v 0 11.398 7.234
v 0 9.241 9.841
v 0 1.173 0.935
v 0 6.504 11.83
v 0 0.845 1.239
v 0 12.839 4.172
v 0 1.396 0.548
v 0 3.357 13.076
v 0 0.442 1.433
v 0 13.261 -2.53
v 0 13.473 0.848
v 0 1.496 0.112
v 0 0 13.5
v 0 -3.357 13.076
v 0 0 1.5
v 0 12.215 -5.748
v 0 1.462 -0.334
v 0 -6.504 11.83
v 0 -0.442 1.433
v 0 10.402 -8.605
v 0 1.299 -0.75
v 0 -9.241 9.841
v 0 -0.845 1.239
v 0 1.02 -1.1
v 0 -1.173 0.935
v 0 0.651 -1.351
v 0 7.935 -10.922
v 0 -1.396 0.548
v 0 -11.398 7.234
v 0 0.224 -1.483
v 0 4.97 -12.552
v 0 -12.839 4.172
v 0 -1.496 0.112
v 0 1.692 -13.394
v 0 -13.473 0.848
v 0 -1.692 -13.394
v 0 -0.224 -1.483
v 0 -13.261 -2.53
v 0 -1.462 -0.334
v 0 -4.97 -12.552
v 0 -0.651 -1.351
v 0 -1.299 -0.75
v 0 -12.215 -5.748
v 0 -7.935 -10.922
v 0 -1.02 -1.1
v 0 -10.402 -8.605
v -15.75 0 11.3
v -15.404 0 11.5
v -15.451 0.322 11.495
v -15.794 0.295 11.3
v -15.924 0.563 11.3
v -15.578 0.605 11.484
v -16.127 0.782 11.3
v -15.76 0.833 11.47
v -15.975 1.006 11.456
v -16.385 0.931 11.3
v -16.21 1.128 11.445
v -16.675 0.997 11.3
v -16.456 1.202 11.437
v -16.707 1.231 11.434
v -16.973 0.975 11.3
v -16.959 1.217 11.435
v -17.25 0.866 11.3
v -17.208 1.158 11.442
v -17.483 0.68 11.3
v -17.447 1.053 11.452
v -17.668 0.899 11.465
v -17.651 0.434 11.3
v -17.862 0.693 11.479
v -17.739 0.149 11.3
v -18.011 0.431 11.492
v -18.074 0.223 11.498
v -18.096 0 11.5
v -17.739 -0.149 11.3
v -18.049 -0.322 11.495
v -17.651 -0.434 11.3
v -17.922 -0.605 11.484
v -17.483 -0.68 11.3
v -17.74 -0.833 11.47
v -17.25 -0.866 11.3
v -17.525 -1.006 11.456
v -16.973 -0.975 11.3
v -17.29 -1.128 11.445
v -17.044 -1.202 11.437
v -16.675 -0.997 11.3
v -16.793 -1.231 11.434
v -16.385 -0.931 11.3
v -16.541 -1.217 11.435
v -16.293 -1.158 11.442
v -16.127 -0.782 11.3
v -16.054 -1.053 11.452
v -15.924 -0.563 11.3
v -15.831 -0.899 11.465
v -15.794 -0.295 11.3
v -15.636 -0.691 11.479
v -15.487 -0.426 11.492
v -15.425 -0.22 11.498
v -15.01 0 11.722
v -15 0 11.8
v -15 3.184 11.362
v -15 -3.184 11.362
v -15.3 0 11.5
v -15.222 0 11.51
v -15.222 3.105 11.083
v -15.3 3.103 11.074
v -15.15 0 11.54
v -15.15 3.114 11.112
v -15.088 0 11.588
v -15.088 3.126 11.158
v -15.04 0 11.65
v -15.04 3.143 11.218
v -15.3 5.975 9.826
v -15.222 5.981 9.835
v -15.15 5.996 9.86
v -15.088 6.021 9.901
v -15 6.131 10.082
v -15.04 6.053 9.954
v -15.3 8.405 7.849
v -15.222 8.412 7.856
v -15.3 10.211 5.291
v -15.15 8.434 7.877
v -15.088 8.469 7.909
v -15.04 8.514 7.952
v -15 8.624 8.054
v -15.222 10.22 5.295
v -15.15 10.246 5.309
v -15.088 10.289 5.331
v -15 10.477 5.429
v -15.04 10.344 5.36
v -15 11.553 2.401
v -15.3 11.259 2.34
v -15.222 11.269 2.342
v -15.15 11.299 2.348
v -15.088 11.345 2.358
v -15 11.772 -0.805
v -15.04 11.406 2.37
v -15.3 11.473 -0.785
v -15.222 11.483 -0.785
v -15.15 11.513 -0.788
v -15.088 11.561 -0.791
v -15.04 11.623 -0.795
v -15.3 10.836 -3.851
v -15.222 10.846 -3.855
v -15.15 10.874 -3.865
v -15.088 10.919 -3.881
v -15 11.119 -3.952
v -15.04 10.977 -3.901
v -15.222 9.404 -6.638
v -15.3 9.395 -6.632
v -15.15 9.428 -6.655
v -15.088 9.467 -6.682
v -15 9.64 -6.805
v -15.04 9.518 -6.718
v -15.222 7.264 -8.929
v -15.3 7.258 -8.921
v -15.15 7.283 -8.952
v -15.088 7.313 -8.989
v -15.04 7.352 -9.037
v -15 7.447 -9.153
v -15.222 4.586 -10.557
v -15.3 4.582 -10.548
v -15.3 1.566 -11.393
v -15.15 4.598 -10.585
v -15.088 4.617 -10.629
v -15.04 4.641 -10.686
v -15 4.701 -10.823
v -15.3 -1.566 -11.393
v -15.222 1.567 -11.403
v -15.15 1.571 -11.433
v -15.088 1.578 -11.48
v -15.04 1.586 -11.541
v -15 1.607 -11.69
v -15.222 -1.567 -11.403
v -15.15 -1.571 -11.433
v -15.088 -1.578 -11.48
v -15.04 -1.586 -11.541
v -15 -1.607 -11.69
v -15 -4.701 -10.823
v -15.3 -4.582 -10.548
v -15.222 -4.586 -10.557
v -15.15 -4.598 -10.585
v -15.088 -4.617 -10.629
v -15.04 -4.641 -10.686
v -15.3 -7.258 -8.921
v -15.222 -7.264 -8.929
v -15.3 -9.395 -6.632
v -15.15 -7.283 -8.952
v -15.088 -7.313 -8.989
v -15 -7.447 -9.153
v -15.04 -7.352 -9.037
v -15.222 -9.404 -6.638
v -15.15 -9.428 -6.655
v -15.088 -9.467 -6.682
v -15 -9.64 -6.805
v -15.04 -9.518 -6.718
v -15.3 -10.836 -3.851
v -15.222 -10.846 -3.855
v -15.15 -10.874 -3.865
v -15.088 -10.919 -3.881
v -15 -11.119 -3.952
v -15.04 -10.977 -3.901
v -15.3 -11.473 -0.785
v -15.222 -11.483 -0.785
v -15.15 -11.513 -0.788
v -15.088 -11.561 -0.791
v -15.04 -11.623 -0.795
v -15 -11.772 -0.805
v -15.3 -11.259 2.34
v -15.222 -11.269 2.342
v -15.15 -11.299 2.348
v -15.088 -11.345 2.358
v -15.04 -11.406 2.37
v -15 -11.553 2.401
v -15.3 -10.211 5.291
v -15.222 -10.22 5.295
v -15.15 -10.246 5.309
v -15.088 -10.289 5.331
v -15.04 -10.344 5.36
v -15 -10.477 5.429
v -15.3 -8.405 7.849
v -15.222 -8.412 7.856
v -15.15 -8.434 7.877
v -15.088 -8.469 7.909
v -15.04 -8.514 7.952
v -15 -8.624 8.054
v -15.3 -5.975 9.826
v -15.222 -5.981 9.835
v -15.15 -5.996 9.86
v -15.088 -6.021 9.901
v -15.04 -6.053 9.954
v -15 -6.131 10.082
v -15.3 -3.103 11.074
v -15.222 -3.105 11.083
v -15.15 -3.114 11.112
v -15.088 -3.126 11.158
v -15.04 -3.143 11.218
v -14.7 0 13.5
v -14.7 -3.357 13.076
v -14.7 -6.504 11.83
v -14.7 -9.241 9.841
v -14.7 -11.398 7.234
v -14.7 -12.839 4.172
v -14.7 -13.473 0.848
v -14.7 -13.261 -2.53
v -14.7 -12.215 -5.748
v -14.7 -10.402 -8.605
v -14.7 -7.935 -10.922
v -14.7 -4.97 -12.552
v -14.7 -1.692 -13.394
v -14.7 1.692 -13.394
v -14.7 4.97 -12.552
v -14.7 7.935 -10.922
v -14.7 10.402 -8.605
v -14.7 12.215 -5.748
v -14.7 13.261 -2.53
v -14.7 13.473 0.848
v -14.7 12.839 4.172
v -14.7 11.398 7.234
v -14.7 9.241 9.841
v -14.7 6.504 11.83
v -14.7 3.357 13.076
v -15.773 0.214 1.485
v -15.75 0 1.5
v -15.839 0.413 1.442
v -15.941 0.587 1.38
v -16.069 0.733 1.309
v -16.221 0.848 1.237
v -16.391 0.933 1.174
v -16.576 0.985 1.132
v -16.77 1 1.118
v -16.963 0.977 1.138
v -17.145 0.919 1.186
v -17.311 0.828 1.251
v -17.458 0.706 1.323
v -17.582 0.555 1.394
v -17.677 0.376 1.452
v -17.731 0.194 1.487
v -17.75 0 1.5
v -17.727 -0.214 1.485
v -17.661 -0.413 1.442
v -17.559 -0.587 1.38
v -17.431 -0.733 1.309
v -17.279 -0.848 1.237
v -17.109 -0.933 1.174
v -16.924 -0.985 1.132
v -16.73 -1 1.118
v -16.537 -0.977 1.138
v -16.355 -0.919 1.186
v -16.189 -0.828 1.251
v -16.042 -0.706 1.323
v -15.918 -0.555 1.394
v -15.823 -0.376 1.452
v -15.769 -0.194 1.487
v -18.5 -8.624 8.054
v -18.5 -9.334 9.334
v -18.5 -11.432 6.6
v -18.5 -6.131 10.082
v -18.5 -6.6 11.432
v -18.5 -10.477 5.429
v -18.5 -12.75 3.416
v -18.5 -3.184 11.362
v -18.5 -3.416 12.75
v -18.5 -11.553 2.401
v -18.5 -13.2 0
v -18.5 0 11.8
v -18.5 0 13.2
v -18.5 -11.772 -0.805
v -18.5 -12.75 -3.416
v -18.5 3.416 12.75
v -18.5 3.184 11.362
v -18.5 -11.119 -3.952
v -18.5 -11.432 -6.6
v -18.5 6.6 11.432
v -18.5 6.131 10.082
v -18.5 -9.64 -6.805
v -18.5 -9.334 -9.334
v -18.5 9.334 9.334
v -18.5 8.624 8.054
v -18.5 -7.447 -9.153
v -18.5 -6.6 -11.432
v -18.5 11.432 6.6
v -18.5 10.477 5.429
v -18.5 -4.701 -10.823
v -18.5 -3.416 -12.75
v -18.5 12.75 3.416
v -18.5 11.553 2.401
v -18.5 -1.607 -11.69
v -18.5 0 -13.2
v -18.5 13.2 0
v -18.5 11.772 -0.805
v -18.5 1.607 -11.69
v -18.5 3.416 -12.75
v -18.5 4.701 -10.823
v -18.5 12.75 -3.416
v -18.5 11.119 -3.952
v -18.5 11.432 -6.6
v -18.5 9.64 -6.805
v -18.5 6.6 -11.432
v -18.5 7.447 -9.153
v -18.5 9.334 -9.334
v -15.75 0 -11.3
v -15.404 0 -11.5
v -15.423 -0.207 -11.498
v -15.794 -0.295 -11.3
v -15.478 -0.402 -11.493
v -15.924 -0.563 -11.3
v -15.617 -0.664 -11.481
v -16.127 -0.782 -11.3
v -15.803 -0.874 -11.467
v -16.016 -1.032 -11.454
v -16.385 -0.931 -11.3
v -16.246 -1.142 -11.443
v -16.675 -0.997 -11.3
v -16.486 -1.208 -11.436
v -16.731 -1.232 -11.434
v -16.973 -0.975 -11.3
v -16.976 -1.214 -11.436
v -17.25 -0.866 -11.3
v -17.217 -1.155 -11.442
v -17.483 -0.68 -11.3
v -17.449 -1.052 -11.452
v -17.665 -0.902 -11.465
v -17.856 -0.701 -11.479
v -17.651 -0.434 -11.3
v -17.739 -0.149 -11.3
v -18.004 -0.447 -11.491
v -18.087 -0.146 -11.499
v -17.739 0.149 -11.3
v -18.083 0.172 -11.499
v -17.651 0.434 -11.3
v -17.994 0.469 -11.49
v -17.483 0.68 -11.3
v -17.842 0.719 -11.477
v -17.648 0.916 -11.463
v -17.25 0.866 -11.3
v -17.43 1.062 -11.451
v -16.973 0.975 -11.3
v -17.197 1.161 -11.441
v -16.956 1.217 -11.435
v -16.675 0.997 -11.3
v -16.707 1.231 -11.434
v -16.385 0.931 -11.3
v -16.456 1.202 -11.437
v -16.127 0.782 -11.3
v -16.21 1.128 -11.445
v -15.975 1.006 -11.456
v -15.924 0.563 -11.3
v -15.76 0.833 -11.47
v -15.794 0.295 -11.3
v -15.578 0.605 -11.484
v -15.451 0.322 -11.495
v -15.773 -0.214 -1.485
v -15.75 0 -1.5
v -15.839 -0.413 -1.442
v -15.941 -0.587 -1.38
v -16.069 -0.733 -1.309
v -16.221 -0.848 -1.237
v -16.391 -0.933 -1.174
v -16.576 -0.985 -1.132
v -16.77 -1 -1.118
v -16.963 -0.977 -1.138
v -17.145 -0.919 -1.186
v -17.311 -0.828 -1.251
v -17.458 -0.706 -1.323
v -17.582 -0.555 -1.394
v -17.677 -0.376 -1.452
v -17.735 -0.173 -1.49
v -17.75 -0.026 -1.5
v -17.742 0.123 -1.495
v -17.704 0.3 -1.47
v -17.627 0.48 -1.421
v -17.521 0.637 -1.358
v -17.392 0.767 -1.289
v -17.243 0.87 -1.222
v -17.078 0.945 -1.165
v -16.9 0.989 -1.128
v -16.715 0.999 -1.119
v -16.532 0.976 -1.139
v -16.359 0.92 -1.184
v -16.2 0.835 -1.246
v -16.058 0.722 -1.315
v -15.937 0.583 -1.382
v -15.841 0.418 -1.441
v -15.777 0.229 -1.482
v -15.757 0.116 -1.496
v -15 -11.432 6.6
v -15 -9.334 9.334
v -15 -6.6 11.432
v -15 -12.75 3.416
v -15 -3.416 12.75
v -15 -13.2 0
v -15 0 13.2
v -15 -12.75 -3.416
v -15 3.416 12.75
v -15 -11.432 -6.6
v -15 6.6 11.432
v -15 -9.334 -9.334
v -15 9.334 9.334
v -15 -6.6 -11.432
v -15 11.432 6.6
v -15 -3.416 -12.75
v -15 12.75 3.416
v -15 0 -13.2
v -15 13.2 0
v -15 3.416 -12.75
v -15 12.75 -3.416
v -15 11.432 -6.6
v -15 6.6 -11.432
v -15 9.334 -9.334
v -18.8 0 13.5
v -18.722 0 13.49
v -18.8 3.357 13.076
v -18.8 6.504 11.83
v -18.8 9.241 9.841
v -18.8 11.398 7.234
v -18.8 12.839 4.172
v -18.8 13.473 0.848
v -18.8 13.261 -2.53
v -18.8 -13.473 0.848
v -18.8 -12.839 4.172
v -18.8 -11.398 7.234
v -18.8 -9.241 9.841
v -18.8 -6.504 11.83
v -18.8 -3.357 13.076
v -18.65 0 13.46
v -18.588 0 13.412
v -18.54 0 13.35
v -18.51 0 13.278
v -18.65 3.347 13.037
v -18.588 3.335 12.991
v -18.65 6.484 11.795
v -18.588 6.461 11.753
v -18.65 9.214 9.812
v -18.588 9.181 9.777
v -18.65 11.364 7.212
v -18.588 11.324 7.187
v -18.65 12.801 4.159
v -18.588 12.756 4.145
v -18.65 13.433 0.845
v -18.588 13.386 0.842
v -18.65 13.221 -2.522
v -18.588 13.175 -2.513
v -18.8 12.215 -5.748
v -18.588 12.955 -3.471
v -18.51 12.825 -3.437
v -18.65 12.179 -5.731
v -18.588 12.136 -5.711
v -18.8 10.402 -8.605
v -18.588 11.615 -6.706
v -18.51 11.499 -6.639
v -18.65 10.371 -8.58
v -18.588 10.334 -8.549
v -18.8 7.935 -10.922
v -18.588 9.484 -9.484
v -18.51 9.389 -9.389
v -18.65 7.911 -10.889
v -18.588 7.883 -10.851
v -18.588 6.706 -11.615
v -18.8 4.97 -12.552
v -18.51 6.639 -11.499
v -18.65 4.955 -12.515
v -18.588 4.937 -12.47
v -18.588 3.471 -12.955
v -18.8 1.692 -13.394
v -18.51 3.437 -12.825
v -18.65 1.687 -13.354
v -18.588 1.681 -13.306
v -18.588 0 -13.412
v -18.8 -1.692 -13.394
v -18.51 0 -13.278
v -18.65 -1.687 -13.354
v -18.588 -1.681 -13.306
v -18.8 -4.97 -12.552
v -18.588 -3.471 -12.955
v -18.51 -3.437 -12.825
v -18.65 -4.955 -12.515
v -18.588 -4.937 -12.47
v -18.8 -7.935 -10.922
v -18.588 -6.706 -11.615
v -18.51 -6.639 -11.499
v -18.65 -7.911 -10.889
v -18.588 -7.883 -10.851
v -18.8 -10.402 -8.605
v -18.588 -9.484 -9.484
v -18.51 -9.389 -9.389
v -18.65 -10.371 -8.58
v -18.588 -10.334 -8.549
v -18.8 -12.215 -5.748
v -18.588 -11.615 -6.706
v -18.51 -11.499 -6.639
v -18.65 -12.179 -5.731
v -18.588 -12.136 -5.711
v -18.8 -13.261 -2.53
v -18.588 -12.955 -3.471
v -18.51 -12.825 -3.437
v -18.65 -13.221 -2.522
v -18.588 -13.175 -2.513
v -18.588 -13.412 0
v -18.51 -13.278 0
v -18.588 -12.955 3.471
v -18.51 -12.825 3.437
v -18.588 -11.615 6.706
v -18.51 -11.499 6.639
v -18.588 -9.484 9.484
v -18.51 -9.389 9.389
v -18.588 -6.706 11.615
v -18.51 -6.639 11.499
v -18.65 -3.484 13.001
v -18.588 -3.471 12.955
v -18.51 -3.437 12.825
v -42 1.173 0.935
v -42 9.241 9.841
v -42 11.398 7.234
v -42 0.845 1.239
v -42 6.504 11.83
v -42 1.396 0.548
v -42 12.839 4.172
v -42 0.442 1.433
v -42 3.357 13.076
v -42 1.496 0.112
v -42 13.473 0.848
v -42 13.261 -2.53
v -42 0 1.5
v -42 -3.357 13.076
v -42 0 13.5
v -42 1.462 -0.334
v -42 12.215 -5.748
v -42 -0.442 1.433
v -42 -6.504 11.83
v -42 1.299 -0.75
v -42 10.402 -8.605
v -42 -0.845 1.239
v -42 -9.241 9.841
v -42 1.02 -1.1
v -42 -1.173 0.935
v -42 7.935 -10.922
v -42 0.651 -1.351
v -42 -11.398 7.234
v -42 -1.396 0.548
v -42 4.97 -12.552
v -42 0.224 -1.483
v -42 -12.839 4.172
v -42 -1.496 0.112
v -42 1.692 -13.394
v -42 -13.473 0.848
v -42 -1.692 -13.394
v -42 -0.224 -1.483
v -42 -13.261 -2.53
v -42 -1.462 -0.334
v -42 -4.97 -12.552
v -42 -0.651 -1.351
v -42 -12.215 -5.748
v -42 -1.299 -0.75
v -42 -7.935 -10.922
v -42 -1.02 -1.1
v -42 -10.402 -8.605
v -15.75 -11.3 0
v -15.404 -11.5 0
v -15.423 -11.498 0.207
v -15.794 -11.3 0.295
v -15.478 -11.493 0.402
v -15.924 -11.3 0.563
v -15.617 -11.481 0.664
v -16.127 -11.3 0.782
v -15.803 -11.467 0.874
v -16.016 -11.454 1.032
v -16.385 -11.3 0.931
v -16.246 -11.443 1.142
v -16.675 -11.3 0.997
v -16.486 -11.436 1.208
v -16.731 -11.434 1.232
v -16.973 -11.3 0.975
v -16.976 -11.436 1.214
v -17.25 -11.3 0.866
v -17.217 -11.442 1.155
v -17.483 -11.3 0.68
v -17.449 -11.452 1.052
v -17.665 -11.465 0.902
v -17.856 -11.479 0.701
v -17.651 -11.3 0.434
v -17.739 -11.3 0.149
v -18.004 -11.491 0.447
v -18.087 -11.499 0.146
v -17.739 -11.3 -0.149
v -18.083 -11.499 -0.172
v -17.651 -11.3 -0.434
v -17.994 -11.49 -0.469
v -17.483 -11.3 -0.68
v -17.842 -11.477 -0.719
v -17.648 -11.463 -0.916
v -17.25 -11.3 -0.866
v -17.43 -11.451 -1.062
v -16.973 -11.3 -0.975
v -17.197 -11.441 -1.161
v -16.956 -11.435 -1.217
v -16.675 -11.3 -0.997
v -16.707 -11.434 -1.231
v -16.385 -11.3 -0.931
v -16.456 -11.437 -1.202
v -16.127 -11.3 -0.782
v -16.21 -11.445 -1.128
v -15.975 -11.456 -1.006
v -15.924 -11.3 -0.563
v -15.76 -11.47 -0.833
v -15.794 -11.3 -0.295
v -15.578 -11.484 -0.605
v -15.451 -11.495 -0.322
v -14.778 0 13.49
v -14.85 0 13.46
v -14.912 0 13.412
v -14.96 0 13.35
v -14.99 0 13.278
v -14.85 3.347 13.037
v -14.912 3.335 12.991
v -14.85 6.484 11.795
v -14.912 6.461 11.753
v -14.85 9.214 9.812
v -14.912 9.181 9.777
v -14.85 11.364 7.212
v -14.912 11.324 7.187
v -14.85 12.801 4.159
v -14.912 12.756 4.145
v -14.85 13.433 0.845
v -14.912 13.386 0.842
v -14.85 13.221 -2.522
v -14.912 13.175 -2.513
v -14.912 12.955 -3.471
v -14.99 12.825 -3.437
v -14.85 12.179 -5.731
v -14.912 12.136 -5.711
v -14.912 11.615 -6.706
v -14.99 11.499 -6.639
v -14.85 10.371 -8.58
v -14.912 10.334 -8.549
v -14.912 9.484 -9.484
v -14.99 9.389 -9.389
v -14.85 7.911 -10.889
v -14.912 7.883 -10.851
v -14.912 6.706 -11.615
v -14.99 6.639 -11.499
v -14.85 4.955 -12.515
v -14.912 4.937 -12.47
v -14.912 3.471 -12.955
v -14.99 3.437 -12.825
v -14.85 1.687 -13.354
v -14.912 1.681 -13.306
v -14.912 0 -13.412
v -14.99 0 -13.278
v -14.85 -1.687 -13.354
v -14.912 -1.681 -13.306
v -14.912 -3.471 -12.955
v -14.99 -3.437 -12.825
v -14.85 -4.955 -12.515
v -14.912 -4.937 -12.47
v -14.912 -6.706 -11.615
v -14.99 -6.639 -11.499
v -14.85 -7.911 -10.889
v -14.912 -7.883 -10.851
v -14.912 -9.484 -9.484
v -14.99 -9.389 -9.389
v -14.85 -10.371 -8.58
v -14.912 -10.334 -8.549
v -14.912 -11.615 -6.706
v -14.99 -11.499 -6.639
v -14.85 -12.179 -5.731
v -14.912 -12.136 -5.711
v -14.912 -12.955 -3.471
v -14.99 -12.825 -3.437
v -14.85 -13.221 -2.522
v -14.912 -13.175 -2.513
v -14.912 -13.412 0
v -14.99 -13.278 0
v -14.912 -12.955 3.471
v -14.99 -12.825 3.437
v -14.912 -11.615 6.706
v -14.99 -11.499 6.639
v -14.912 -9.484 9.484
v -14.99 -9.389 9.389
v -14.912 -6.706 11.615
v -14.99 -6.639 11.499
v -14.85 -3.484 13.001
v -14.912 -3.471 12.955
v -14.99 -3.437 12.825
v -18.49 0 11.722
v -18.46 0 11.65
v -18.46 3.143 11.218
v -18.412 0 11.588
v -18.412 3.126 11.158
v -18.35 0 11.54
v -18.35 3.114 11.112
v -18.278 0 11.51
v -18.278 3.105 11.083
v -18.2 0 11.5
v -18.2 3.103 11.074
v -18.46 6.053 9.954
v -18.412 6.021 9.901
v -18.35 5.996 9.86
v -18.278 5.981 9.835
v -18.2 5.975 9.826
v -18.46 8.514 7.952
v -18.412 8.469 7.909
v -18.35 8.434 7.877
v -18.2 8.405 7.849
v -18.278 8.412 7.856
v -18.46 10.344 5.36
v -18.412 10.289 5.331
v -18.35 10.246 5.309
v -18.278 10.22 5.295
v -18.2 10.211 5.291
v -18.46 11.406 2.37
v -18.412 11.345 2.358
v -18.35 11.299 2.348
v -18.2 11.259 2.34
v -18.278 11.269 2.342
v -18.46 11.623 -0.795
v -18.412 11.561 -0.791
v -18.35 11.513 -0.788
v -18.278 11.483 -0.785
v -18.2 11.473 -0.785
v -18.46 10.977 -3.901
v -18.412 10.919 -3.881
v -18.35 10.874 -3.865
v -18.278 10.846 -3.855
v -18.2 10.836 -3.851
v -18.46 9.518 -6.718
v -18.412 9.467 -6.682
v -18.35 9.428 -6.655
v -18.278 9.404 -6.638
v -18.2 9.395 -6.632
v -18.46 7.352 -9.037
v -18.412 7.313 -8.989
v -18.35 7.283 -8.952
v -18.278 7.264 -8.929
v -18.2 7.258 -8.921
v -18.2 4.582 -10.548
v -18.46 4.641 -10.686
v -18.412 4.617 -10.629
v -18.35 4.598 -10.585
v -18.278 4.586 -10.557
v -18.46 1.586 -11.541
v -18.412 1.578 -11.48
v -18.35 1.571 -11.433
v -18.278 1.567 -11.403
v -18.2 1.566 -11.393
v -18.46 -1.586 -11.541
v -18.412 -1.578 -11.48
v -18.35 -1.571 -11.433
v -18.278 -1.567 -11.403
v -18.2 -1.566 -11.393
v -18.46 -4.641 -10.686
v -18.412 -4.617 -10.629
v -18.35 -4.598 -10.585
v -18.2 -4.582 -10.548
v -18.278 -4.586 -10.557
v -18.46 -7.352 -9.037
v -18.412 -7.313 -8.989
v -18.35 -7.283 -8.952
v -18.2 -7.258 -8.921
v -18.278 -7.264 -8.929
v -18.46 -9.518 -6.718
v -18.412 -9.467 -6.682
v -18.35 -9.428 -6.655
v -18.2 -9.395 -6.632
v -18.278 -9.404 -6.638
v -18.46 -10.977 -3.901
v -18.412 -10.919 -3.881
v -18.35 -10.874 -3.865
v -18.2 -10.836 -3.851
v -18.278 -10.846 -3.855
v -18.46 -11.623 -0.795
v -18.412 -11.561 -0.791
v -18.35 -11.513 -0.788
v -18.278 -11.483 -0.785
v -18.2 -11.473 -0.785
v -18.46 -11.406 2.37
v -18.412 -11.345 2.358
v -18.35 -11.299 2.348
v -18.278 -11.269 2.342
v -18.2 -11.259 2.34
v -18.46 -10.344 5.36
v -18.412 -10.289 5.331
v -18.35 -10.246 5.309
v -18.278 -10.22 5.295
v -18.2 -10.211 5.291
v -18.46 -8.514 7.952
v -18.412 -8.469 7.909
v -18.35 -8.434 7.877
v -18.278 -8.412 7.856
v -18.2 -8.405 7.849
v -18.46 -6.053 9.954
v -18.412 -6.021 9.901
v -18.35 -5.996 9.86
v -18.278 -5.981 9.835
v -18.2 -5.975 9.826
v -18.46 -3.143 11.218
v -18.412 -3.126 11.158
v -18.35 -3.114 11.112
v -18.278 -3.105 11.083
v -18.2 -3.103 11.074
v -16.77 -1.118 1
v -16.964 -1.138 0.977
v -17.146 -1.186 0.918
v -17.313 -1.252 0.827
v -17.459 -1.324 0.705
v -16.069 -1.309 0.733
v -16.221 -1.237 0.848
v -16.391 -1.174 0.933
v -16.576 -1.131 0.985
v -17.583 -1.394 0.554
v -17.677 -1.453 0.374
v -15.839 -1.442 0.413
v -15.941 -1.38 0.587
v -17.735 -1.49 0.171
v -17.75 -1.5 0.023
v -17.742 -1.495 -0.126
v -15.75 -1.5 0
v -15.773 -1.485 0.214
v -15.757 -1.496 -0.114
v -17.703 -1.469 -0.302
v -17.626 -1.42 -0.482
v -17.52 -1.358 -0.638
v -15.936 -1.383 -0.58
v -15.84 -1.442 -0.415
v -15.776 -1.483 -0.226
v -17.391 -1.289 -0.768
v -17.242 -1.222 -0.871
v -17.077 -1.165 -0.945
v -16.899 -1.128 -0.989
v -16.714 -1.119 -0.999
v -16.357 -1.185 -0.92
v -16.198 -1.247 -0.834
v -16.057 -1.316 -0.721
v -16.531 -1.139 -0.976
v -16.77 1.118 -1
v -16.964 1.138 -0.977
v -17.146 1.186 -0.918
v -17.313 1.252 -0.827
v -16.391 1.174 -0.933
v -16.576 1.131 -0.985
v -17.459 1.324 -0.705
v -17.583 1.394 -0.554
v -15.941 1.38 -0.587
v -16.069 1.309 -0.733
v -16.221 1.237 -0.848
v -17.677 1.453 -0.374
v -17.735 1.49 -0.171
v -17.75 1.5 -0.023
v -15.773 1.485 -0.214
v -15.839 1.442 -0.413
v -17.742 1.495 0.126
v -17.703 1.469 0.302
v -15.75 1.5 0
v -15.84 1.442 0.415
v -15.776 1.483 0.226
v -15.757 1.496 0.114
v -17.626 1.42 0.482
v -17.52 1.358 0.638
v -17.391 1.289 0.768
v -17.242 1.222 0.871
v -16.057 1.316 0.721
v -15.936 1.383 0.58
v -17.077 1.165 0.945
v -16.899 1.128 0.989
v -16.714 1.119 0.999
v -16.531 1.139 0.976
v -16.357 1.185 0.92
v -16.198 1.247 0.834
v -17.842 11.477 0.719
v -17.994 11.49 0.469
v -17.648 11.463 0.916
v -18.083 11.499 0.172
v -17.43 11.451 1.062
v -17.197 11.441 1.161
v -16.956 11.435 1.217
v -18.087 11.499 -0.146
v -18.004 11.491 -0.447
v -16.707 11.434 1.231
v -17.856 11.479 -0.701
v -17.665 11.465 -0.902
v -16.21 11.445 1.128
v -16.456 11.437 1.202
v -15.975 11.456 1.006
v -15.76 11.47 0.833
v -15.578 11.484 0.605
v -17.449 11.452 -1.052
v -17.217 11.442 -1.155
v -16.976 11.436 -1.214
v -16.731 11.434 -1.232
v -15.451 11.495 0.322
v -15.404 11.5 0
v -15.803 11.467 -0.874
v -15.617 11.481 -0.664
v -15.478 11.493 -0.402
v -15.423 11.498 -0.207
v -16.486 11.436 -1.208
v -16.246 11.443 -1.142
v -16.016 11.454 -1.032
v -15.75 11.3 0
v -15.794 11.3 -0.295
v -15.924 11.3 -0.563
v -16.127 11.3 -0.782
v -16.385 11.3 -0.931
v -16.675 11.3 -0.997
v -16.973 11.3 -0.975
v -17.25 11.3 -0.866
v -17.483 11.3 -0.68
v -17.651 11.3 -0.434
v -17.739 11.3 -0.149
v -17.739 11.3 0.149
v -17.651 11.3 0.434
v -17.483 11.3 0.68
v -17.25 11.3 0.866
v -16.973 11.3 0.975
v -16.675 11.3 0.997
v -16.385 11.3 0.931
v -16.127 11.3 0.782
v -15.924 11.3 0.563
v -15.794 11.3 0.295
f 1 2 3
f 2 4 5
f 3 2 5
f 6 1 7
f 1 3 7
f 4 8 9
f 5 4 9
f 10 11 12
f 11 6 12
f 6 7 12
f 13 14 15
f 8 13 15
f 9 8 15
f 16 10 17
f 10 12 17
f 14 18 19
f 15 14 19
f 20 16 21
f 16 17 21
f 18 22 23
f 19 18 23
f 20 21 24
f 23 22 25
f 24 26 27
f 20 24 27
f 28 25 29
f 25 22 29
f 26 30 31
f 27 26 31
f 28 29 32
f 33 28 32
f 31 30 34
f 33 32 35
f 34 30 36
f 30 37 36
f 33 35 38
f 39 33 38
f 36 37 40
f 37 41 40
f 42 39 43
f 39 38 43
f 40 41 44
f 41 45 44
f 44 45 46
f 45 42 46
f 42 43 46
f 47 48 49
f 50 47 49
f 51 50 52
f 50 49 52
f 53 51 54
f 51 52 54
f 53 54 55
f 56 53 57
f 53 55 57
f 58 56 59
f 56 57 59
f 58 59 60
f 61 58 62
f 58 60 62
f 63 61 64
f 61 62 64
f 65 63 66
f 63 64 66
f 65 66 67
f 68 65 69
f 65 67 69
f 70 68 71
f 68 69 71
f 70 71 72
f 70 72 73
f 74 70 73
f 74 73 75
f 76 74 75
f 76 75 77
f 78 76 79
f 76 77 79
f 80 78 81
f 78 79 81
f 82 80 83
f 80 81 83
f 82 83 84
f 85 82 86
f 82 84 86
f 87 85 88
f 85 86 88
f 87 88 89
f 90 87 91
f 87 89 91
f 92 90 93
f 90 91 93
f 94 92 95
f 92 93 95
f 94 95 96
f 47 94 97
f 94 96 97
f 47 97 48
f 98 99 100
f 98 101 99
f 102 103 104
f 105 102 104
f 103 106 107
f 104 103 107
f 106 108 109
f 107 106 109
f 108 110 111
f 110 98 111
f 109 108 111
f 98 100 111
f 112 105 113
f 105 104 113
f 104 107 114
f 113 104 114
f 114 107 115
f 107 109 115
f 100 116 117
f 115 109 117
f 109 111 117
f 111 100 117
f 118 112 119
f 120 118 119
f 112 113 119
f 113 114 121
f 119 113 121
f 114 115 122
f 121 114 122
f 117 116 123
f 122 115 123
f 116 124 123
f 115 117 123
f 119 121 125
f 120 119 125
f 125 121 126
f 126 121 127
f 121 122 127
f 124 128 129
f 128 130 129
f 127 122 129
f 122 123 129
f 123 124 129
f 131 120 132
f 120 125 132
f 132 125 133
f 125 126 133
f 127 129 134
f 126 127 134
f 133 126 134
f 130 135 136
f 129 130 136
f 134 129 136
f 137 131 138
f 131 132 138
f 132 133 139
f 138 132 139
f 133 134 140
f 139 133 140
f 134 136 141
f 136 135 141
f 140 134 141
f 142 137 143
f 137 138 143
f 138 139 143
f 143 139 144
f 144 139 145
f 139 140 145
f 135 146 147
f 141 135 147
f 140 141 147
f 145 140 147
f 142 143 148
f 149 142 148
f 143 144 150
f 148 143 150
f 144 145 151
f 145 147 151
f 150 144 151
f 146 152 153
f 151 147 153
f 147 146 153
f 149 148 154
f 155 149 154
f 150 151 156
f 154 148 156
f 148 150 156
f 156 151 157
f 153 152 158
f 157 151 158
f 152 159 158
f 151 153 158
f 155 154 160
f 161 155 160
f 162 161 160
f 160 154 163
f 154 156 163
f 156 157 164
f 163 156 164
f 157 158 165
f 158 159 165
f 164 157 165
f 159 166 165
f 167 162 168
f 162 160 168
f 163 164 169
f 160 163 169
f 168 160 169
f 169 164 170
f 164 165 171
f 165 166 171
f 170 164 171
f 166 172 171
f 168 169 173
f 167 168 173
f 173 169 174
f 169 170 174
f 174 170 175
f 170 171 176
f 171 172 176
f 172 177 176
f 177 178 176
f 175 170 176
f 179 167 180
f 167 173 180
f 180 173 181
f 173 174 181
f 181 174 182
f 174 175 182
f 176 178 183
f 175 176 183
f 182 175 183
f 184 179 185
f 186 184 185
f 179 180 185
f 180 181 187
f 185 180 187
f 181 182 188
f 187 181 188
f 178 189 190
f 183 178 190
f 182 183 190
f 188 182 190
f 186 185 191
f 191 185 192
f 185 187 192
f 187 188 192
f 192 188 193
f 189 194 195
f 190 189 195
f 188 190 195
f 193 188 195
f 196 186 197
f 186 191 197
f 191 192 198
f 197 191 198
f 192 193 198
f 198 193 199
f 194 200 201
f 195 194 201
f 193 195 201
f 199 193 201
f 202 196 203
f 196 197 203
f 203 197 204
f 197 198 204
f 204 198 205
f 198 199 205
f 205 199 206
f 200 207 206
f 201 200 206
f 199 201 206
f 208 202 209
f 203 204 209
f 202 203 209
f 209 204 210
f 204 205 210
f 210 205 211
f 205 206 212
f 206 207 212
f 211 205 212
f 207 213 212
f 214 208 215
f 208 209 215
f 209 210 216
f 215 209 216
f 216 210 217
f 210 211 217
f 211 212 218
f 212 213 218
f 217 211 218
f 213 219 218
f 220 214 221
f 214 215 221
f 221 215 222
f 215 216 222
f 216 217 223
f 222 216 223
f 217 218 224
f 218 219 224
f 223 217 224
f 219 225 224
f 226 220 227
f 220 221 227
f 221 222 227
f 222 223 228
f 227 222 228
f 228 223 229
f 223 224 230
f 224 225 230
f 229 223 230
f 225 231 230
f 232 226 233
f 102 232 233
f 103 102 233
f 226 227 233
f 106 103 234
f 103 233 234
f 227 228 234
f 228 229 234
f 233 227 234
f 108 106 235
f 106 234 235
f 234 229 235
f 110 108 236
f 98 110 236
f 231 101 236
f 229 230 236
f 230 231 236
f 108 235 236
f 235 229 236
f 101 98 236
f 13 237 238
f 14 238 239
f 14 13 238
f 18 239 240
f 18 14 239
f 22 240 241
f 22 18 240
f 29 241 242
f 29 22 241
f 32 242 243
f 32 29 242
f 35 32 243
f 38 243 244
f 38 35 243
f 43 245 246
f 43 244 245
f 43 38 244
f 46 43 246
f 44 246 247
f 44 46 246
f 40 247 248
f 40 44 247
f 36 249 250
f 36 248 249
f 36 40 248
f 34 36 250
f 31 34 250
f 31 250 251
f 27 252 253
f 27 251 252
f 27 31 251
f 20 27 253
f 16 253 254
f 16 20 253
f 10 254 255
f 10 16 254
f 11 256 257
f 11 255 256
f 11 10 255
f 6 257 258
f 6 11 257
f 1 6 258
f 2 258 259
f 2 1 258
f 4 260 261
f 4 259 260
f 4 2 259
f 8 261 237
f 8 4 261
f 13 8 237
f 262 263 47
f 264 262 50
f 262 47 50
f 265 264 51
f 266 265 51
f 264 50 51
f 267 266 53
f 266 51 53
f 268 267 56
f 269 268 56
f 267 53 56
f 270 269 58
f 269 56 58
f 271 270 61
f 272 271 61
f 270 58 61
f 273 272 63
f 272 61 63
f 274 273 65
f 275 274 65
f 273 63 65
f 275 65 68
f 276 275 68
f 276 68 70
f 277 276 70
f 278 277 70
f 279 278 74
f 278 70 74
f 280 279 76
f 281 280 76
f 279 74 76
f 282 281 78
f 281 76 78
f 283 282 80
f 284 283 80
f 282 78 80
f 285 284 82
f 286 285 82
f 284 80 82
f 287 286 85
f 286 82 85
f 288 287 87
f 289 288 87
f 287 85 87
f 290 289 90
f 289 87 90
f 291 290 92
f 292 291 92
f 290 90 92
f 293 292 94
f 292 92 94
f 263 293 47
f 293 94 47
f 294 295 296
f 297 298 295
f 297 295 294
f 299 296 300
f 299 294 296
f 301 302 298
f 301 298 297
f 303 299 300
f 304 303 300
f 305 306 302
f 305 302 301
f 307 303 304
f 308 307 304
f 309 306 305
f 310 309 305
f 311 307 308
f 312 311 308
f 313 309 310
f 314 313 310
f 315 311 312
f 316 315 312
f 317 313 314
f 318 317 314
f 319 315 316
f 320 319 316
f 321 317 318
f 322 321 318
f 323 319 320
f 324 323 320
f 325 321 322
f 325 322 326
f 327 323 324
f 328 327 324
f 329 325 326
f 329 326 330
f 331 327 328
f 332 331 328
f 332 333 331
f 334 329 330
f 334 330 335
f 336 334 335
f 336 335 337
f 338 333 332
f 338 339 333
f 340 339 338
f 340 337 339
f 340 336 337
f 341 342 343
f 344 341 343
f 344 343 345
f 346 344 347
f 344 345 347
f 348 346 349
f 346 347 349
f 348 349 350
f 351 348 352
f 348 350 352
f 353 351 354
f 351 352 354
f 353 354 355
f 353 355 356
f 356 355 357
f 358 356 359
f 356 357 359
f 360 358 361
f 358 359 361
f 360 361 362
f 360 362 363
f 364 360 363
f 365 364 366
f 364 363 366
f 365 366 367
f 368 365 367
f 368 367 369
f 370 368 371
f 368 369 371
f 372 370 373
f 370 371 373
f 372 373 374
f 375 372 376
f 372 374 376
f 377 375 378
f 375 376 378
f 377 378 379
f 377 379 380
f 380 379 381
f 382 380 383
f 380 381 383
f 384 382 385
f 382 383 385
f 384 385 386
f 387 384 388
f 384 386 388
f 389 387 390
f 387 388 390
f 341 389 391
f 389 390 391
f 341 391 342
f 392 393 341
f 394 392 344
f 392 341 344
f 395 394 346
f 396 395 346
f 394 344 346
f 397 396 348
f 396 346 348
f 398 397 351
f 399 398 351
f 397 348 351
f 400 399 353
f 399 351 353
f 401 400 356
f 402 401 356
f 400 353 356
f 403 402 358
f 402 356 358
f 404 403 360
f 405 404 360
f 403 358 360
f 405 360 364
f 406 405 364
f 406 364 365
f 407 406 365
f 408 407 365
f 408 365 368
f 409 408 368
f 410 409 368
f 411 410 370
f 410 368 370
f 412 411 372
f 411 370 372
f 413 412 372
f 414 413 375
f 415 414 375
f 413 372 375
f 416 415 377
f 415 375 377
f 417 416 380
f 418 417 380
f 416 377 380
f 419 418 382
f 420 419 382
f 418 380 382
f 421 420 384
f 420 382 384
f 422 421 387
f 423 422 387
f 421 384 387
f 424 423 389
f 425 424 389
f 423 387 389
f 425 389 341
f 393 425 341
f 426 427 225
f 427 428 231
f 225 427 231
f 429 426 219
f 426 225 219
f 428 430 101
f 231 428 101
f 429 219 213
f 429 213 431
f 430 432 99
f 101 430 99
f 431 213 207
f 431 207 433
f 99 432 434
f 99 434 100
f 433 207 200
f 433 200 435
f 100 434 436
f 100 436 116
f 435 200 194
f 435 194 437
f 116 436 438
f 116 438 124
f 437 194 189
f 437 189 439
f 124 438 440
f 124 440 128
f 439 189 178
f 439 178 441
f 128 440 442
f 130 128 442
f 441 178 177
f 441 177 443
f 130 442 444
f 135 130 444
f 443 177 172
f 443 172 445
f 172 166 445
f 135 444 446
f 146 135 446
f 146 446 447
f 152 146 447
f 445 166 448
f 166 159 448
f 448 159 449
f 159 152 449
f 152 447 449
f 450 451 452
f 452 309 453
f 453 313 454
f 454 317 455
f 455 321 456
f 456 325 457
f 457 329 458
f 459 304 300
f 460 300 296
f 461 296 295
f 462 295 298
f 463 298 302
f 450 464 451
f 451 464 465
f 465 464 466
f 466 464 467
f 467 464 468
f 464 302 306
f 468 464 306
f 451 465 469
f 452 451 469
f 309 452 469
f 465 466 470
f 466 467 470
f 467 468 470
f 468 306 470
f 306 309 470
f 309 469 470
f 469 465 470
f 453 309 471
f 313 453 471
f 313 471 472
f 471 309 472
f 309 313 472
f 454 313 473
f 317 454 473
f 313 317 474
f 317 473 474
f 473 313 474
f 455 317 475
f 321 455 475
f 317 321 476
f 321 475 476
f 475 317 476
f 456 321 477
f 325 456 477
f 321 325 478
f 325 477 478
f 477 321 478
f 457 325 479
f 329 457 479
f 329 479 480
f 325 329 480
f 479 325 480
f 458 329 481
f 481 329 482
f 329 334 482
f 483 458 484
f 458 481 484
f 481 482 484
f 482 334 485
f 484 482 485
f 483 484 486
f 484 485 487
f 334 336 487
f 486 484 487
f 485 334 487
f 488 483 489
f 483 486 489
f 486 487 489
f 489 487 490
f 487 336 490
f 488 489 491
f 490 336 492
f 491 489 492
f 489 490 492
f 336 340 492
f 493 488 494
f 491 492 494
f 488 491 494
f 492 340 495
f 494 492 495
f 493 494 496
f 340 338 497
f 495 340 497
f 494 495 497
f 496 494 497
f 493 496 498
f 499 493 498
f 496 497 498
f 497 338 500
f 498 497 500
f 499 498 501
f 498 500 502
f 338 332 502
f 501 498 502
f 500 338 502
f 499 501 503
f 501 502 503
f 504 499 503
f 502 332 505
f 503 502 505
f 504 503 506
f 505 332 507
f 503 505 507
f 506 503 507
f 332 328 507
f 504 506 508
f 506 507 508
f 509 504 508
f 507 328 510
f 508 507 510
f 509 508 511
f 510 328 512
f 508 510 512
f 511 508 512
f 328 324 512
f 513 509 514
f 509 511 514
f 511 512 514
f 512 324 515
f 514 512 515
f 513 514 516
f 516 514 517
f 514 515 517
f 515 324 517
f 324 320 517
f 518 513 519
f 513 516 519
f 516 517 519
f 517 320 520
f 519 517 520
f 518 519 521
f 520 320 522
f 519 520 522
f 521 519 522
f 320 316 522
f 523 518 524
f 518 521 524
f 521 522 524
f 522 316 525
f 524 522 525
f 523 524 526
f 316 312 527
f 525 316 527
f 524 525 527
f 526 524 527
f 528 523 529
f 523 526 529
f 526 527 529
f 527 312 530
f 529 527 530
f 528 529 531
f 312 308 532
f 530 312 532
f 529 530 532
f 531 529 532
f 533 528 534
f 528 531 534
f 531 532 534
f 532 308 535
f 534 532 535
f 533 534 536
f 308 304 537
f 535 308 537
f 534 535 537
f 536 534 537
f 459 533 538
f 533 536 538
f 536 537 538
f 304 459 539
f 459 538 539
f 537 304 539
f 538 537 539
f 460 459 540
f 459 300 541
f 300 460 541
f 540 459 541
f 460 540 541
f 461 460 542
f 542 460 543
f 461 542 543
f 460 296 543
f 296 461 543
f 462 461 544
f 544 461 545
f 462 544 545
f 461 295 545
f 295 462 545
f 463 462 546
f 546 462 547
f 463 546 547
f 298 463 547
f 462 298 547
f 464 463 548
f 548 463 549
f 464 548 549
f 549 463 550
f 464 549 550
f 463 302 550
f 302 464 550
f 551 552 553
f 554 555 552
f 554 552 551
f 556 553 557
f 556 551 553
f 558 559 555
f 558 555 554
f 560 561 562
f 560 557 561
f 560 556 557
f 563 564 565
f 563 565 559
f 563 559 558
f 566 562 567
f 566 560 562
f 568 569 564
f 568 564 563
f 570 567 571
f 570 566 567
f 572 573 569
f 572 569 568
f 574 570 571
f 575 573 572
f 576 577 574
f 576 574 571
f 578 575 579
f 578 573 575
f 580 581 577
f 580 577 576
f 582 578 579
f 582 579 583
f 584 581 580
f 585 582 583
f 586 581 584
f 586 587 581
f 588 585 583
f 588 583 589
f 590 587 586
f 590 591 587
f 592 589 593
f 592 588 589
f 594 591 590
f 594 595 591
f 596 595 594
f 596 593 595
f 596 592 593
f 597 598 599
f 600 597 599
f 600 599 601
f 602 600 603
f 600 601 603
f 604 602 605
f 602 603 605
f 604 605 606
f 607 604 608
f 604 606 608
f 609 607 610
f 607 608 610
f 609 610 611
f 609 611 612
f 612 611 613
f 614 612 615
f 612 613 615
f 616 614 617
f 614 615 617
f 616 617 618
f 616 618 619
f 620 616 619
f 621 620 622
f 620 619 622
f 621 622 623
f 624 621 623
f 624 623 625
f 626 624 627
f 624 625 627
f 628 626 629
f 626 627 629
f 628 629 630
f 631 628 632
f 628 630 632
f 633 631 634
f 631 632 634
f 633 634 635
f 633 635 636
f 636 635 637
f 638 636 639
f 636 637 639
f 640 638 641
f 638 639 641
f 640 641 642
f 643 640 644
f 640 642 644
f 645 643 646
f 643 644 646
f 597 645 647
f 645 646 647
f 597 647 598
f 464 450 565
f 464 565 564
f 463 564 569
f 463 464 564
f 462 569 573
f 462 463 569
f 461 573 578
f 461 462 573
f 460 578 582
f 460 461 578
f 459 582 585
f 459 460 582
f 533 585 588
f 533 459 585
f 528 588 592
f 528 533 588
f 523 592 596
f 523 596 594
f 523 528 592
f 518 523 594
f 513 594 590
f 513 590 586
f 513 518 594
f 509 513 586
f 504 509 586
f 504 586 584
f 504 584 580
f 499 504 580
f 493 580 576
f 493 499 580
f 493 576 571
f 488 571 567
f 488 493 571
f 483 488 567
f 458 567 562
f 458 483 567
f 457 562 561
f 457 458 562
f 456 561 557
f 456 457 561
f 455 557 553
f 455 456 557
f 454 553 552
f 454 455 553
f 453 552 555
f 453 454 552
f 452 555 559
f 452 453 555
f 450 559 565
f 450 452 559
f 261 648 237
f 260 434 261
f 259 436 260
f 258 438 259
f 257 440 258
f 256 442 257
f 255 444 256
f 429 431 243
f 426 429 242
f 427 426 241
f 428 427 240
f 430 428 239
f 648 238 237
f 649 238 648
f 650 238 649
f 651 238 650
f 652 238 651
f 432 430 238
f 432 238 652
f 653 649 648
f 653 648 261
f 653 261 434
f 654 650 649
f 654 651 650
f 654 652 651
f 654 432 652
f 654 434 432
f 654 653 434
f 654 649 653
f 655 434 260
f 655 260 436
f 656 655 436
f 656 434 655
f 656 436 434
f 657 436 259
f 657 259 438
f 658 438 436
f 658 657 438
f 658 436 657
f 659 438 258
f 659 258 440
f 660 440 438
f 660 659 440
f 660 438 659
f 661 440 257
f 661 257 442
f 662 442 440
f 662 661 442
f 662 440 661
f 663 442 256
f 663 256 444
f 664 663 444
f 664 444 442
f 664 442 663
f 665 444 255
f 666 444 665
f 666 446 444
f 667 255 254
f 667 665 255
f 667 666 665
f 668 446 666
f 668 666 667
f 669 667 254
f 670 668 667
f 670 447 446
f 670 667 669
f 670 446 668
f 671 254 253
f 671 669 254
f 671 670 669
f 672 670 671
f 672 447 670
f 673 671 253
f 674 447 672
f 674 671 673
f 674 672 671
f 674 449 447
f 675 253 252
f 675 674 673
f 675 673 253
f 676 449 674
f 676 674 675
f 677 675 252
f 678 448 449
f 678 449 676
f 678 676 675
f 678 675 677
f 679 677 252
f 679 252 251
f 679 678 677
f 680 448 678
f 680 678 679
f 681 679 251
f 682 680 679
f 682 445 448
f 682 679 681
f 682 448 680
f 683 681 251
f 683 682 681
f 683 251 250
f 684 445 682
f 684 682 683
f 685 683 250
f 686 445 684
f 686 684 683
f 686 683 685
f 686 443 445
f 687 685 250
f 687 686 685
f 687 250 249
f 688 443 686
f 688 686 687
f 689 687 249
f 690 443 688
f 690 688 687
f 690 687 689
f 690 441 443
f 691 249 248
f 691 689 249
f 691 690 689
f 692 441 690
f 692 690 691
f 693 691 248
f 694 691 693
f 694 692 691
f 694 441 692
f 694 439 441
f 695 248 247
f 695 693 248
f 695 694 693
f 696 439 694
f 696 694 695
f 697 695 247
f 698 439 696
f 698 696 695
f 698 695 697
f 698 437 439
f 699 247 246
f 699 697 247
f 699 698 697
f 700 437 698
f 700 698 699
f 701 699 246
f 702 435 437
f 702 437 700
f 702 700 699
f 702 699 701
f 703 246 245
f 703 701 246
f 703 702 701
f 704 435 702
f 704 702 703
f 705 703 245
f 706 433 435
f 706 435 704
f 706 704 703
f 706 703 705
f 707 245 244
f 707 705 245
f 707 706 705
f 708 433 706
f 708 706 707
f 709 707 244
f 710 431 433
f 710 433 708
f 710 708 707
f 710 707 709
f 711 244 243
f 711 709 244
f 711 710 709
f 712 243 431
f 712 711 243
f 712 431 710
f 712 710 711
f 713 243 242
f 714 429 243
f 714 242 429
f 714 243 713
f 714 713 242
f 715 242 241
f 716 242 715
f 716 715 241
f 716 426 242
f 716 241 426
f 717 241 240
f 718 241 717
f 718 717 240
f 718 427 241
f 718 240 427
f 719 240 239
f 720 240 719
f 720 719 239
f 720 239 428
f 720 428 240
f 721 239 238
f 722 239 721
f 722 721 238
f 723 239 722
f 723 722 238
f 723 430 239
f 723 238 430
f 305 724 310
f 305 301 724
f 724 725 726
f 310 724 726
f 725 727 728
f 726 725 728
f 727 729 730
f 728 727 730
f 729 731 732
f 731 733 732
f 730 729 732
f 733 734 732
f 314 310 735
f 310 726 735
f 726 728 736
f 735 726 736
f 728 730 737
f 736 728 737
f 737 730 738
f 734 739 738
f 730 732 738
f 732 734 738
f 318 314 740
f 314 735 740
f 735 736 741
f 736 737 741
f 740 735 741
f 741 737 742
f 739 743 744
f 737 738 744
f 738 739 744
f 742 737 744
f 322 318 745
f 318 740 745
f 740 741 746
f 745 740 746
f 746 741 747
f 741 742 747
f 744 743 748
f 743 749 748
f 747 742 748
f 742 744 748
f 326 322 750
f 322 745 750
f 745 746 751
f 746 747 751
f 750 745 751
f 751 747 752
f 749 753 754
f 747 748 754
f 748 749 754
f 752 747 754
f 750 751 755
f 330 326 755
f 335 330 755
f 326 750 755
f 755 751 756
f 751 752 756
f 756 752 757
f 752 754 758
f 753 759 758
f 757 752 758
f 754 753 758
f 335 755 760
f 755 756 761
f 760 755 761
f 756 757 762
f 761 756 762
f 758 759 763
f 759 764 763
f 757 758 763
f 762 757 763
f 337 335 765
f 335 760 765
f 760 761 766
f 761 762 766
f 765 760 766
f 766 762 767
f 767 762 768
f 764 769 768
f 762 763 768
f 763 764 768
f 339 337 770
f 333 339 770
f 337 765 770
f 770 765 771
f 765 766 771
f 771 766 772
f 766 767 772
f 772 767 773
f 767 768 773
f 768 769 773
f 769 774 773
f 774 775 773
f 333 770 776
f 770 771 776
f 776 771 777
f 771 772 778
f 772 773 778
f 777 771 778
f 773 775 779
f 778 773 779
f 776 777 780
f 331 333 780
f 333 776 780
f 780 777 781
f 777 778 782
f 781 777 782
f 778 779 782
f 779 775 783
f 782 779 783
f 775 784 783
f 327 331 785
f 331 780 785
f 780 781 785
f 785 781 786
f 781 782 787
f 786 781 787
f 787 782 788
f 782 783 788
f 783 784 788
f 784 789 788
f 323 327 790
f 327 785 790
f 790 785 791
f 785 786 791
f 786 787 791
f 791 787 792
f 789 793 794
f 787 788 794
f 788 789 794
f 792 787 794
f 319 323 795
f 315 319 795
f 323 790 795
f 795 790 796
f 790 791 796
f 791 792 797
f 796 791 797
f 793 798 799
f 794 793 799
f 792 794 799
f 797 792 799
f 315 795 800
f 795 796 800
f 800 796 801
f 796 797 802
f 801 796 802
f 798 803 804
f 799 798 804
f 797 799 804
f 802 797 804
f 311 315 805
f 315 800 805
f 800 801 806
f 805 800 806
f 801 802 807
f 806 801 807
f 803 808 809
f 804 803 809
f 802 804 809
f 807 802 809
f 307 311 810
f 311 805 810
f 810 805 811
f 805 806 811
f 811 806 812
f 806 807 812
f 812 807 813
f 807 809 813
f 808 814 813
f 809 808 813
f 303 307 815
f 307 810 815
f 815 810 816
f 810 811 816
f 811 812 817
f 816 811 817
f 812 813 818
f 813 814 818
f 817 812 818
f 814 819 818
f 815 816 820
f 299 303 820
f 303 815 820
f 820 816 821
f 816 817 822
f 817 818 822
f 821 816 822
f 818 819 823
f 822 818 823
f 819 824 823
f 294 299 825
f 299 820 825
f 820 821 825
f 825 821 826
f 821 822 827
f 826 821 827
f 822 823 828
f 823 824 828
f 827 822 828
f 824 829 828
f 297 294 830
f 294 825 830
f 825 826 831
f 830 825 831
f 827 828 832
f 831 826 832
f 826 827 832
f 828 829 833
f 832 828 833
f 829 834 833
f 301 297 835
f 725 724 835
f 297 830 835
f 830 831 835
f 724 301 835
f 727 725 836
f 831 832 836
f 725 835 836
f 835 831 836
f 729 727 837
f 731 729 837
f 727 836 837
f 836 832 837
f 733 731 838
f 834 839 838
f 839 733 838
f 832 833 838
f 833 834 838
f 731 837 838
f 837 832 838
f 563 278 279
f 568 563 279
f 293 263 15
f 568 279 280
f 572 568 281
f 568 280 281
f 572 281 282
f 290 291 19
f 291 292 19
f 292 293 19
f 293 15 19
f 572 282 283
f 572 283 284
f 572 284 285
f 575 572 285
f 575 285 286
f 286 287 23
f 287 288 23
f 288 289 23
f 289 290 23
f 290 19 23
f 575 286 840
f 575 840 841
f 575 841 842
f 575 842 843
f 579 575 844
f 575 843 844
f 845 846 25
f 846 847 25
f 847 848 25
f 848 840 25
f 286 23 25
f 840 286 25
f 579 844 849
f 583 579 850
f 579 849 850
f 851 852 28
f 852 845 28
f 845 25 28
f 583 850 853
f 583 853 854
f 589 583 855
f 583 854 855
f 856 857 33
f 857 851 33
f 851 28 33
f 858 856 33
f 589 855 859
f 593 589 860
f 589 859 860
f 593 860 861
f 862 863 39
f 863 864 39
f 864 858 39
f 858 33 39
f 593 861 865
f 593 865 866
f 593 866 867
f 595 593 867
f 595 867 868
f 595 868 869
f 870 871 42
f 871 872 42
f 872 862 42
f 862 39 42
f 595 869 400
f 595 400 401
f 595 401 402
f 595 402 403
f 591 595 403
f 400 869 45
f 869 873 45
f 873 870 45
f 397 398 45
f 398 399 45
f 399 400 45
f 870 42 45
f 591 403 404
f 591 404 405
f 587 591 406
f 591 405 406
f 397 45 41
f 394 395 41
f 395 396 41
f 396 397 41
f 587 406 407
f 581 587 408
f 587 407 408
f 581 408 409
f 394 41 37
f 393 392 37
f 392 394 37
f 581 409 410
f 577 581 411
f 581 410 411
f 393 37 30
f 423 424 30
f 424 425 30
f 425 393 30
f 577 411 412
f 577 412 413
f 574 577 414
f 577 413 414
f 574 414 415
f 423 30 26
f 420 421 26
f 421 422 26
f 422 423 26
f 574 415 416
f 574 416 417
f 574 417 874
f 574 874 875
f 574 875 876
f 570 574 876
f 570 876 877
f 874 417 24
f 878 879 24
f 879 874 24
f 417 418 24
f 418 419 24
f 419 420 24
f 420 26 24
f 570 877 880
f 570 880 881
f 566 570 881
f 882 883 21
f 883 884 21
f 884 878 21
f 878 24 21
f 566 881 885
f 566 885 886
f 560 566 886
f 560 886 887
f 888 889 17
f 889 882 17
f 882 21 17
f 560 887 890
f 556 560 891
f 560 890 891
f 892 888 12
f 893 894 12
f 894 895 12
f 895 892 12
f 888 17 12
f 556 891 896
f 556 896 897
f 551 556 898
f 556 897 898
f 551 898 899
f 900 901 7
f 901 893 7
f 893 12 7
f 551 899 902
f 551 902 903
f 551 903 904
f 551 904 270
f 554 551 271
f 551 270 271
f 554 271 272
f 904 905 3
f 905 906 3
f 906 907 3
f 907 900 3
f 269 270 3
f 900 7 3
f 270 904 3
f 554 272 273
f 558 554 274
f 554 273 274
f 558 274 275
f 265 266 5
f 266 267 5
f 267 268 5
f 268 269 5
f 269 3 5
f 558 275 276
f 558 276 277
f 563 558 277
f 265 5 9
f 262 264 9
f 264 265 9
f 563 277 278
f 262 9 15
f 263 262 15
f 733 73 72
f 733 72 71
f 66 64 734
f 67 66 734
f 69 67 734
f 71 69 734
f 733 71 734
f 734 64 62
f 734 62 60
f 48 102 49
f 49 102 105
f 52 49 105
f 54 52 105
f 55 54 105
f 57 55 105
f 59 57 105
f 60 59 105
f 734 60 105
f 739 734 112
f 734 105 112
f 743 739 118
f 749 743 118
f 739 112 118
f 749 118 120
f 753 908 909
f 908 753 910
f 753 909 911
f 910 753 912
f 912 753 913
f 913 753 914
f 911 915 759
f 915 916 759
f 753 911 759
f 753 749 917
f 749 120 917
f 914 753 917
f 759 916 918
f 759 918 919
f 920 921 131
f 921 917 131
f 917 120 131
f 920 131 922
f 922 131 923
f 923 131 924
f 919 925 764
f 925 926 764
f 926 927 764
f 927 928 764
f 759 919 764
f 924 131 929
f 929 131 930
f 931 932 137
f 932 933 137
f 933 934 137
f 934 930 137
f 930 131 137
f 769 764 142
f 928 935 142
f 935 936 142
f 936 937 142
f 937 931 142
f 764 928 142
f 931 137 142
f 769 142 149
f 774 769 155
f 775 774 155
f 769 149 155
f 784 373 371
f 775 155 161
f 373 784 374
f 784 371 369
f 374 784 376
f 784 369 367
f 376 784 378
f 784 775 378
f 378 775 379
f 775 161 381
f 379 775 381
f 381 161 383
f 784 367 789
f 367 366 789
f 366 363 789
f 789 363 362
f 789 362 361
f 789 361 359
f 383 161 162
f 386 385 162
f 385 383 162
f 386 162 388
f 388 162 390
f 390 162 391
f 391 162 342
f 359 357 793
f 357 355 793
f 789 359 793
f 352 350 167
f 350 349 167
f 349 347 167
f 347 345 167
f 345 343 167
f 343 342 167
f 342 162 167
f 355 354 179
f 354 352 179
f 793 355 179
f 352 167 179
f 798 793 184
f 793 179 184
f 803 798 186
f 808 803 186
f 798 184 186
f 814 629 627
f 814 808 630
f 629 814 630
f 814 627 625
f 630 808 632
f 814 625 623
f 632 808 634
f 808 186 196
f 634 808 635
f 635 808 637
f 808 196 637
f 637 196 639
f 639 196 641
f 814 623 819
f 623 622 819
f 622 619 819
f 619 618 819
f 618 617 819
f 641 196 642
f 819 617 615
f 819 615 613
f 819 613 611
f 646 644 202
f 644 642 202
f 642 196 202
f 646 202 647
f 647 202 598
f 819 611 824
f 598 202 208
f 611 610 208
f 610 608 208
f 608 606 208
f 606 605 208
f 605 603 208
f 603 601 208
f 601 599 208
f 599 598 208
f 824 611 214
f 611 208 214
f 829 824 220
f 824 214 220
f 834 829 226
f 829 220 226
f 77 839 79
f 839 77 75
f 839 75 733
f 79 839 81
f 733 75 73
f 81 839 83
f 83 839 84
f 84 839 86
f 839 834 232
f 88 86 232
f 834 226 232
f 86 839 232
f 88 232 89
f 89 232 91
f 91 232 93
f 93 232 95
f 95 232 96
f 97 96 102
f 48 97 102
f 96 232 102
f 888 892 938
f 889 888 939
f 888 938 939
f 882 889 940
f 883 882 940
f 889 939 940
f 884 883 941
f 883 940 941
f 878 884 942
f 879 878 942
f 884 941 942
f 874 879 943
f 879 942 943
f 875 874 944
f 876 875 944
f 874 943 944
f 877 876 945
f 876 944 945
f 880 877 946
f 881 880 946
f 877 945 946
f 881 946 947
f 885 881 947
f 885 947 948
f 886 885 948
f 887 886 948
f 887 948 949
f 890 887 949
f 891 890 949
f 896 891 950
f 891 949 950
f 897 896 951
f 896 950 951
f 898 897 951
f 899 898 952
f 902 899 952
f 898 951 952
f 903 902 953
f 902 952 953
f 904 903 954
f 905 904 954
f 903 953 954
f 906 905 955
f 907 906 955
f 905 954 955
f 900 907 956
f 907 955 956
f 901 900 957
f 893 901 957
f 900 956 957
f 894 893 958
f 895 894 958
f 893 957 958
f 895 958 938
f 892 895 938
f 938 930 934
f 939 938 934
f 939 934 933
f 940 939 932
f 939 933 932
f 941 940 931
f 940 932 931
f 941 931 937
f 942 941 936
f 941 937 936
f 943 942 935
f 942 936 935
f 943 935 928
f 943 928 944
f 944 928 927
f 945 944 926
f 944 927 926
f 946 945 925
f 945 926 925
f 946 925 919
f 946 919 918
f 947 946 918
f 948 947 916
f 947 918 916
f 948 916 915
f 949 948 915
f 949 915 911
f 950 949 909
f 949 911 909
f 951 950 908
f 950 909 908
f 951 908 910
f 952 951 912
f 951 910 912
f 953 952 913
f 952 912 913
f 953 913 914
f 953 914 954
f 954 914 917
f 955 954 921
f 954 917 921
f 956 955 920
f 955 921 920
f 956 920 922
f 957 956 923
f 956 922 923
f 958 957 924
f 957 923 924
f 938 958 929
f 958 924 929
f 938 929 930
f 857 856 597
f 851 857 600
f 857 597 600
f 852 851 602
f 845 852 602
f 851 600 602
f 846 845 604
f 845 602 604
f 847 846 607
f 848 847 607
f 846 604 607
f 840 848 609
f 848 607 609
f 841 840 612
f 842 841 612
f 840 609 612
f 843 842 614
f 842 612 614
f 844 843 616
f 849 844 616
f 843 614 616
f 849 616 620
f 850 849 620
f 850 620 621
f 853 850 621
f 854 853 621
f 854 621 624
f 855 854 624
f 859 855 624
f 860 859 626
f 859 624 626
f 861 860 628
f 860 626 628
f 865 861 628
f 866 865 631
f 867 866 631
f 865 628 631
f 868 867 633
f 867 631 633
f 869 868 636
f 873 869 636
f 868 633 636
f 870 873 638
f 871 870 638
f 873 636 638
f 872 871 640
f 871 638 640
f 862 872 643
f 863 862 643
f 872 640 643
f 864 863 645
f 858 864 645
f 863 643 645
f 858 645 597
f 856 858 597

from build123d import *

# Parameters (mm, degrees)
F0_W            = 42
F0_H            = 12
F2_W            = 3.5
F2_H            = 2
F4_R            = 0.3
F6_COPIES_COUNT = 4


# Not quite as in the source:
# - a pattern or mirror of a feature is missing from the dataset's text; its kind, count and spacing are read off the source's solid


with BuildPart() as f1:
    # F0 (on Front) → F1 (revolve)
    with BuildSketch(Plane.XZ):
        with Locations((-21, 7.5)):
            Rectangle(F0_W, F0_H)
    revolve(axis=Axis((-10.2689703926, 0, 0), (1, 0, 0)))

    # F2 (on face) → F3 (revolve, cut)
    with BuildSketch(Plane.XZ):
        with Locations((-16.75, 12.5)):
            Rectangle(F2_W, F2_H)
    revolve(axis=Axis((-21, 0, 0), (-1, 0, 0)), mode=Mode.SUBTRACT)

    # F4
    f4_edges = [f1.edges().sort_by_distance(p)[0] for p in [
        (-18.5, 0, -13.5),
        (-15, 0, -13.5),
        (-18.5, 0, -11.5),
        (-15, 0, -11.5),
    ]]
    fillet(f4_edges, radius=F4_R)

    # F5 (on face) → F6 (revolve, cut)
    with BuildSketch(Plane.XZ):
        Polygon((-15.4035898385, 11.5), (-16.75, 11.5), (-16.75, 0), (-15.75, 0), (-15.75, 11.3), align=None)
    f6 = revolve(axis=Axis((-16.75, 0, 5.75), (0, 0, 1)), mode=Mode.SUBTRACT)

    # F6_copies: F6 ×4 about axis
    f6_copies_axis = Axis((0, 0, 0), (1, 0, 0))
    for i in range(1, F6_COPIES_COUNT):
        add(f6.rotate(f6_copies_axis, i * 360 / F6_COPIES_COUNT), mode=Mode.SUBTRACT)


solid = f1.part
